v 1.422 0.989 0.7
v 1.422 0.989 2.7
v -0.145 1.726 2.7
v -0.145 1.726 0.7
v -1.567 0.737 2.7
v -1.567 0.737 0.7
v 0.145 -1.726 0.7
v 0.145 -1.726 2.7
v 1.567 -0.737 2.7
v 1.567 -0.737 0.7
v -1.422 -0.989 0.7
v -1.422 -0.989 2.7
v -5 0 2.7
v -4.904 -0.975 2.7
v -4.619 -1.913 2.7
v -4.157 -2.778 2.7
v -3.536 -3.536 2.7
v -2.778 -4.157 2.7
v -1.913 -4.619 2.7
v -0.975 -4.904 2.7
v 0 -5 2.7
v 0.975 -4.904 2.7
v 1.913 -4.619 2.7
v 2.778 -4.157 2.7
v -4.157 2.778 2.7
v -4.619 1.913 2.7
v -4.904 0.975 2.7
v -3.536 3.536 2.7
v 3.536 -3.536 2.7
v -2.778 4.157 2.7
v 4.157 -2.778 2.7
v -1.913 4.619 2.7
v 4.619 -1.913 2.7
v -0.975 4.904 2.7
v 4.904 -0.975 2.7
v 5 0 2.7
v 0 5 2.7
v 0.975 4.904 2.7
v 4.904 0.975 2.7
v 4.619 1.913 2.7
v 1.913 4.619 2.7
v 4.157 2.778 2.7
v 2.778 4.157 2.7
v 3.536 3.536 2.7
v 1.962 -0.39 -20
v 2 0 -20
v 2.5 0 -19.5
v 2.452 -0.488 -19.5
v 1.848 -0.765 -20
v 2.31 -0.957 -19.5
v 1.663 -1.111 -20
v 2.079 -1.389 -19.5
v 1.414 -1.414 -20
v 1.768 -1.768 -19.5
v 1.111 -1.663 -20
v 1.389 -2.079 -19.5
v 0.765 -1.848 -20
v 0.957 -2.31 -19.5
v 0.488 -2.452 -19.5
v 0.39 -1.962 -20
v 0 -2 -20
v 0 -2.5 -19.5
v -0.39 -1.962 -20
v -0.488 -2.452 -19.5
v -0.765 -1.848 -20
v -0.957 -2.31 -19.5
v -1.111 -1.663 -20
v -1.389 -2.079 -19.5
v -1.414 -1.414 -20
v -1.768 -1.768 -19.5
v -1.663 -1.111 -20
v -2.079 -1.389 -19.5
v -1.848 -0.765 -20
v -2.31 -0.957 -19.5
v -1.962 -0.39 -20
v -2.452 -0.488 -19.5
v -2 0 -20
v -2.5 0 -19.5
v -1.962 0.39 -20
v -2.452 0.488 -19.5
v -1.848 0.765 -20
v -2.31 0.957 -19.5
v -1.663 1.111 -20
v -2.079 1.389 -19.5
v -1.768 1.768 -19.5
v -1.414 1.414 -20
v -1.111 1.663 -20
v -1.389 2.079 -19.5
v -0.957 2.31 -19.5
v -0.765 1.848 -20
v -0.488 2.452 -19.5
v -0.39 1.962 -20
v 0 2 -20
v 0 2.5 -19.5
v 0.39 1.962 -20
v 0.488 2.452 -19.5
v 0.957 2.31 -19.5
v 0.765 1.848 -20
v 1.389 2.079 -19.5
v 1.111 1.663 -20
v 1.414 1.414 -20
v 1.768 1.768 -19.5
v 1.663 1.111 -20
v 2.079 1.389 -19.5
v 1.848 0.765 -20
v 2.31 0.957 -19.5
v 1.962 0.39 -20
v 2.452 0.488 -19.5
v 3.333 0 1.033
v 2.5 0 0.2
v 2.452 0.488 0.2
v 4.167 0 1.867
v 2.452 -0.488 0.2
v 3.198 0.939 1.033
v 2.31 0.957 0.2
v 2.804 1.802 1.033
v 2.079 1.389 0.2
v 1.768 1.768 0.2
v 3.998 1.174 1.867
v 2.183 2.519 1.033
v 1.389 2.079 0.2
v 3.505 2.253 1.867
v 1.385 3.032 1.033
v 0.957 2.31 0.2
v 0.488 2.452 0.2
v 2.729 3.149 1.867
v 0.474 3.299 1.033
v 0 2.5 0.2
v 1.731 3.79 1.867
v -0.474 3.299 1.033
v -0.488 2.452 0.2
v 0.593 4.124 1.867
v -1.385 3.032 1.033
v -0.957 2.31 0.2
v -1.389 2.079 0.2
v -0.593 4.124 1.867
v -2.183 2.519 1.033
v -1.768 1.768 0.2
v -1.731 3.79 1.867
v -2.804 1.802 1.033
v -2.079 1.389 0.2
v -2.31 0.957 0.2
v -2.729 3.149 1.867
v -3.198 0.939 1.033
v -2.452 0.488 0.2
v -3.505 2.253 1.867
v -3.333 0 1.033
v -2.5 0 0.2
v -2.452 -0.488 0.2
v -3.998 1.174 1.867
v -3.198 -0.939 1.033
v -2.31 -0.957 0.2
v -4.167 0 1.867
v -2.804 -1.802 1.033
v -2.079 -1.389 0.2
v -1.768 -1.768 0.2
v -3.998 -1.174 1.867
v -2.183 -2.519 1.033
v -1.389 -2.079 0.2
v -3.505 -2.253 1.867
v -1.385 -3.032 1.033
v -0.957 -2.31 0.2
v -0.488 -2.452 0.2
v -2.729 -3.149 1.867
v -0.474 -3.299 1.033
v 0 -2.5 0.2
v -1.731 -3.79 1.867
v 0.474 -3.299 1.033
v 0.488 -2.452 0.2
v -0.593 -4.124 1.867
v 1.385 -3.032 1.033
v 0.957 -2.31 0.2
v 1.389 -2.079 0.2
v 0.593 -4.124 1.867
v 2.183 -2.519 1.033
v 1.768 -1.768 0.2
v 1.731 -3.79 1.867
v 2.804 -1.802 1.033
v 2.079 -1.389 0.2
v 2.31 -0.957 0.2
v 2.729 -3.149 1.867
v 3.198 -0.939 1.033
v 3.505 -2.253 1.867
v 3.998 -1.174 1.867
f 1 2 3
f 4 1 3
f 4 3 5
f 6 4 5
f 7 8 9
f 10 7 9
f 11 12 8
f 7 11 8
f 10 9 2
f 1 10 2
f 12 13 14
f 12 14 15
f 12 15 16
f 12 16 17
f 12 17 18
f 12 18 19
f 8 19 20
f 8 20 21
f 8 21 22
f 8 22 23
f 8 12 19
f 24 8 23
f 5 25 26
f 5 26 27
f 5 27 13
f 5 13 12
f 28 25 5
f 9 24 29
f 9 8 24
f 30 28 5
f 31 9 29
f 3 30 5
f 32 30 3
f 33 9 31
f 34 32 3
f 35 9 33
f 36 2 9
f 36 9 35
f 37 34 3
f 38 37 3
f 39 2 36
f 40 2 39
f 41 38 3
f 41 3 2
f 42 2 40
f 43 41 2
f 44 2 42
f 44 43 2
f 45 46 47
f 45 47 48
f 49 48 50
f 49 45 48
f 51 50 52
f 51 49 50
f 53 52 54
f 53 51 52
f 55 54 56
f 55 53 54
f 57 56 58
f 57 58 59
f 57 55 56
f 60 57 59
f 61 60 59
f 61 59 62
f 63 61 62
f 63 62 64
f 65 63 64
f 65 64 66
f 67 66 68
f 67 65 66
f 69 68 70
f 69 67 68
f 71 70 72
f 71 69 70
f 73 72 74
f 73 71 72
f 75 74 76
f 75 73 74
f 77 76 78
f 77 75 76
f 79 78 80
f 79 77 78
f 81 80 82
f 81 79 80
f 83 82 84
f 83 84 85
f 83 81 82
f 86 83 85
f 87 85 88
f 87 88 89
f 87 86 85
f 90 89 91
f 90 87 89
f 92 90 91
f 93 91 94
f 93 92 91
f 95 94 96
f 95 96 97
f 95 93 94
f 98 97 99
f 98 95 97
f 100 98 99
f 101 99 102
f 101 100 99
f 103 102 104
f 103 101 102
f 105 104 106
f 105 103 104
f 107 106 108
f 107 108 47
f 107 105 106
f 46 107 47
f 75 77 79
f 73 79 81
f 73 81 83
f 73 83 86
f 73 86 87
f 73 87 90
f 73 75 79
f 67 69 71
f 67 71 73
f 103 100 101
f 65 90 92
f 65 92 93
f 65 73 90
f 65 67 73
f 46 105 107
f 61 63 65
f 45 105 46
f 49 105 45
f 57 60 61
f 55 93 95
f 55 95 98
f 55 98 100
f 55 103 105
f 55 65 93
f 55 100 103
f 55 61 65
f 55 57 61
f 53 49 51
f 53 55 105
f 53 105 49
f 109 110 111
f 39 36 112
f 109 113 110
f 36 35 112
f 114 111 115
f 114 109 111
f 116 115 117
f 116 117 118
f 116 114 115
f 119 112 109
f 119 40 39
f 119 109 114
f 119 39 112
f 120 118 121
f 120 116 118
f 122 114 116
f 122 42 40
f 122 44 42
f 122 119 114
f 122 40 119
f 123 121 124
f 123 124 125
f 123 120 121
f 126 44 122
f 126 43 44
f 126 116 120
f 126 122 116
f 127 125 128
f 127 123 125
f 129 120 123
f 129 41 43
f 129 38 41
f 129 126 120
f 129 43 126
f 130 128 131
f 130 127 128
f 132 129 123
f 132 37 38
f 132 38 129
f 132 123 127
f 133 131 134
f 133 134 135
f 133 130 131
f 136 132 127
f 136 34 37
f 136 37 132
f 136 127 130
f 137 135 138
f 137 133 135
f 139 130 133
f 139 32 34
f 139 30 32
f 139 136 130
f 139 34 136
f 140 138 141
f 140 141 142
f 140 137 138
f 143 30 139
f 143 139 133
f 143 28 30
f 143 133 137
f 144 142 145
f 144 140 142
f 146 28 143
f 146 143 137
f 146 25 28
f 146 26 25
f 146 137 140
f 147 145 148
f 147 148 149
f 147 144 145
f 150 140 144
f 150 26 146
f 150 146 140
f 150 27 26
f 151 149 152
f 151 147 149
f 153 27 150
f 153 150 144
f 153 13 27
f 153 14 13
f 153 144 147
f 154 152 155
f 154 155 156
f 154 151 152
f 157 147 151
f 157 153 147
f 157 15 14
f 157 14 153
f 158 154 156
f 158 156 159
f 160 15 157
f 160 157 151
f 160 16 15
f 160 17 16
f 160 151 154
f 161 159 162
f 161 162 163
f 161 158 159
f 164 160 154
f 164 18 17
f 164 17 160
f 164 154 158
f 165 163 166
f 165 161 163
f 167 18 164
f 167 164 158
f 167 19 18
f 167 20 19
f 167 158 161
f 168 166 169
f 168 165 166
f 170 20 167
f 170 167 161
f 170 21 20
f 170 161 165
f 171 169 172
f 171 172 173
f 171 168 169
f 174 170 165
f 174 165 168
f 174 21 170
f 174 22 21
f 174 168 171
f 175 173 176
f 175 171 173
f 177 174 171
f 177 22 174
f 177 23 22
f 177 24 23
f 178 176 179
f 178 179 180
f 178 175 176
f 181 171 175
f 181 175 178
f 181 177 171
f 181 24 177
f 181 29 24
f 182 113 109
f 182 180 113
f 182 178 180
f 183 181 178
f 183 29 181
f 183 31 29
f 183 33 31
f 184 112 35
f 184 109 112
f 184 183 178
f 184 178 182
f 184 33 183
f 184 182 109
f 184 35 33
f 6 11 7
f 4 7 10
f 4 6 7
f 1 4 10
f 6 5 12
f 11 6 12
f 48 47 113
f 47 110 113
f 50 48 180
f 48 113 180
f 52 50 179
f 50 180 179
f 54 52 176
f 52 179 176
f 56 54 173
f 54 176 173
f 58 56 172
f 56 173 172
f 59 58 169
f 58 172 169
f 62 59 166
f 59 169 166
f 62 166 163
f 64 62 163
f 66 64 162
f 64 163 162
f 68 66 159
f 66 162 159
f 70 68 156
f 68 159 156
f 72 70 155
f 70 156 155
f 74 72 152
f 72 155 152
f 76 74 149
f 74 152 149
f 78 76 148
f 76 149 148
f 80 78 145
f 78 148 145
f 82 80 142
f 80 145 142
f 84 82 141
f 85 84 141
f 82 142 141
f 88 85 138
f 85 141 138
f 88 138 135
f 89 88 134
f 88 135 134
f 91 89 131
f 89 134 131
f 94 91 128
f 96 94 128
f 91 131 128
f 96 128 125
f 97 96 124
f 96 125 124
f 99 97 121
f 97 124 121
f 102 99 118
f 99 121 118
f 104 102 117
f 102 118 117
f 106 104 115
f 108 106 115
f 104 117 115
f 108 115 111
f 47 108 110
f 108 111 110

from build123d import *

# Parameters (mm, degrees)
F0_R        = 5
F1_DEPTH    = 2.7
F4_DEPTH    = 2
F2_R        = 2.5
F5_DEPTH    = 20
F6_SIZE     = 0.5
F7_S5_R     = 2.5
F7_T6_DEPTH = 9


# Not quite as in the source:
# - a fillet or chamfer that OpenCascade refuses, or shapes differently, is made with other operations: its cross-section is extruded or revolved along the edge and cut away or added
# - a feature names something its author has since deleted; it is built from what else it names


with BuildPart() as f1:
    # F0 (on Top) → F1 (new body)
    with BuildSketch(Plane.XY):
        Circle(F0_R)
    extrude(amount=F1_DEPTH)

    # F3 (on face) → F4 (cut)
    with BuildSketch(Plane.XY.offset(2.7)):
        Polygon((1.4221256636, 0.98871563), (-0.1451900209, 1.725954767), (-1.5673156845, 0.737239137), (-1.4221256636, -0.98871563), (0.1451900209, -1.725954767), (1.5673156845, -0.737239137), align=None)
    extrude(amount=-F4_DEPTH, mode=Mode.SUBTRACT)

    # F2 (on face) → F5 (join)
    with BuildSketch(Plane(origin=(0, 0, 0), x_dir=(1, 0, 0), z_dir=(0, 0, -1))):
        Circle(F2_R)
    extrude(amount=F5_DEPTH)

    # F6
    f6_edges = [f1.edges().sort_by_distance(p)[0] for p in [
        (-2.5, 0, -20),
    ]]
    chamfer(f6_edges, length=F6_SIZE)

    # F7: chamfer of 2.7 on 1 edges, made by hand


with BuildPart() as f7_tool2:
    # F7_s3 → F7_t4 (revolve)
    with BuildSketch(Plane.XZ):
        Polygon((2.3, 0), (5, 2.7), (5, 0), align=None)
    revolve(axis=Axis((0, 0, 0), (0, 0, 1)))

    # F7_s5 → F7_t6 (cut, symmetric)
    with BuildSketch(Plane.XY.offset(1.4)):
        Circle(F7_S5_R)
    extrude(amount=F7_T6_DEPTH, both=True, mode=Mode.SUBTRACT)


with BuildPart() as f1_1:
    add(f1.part)

    # F7_t1: cut F7_tool2
    add(f7_tool2.part, mode=Mode.SUBTRACT)


solid = f1_1.part
